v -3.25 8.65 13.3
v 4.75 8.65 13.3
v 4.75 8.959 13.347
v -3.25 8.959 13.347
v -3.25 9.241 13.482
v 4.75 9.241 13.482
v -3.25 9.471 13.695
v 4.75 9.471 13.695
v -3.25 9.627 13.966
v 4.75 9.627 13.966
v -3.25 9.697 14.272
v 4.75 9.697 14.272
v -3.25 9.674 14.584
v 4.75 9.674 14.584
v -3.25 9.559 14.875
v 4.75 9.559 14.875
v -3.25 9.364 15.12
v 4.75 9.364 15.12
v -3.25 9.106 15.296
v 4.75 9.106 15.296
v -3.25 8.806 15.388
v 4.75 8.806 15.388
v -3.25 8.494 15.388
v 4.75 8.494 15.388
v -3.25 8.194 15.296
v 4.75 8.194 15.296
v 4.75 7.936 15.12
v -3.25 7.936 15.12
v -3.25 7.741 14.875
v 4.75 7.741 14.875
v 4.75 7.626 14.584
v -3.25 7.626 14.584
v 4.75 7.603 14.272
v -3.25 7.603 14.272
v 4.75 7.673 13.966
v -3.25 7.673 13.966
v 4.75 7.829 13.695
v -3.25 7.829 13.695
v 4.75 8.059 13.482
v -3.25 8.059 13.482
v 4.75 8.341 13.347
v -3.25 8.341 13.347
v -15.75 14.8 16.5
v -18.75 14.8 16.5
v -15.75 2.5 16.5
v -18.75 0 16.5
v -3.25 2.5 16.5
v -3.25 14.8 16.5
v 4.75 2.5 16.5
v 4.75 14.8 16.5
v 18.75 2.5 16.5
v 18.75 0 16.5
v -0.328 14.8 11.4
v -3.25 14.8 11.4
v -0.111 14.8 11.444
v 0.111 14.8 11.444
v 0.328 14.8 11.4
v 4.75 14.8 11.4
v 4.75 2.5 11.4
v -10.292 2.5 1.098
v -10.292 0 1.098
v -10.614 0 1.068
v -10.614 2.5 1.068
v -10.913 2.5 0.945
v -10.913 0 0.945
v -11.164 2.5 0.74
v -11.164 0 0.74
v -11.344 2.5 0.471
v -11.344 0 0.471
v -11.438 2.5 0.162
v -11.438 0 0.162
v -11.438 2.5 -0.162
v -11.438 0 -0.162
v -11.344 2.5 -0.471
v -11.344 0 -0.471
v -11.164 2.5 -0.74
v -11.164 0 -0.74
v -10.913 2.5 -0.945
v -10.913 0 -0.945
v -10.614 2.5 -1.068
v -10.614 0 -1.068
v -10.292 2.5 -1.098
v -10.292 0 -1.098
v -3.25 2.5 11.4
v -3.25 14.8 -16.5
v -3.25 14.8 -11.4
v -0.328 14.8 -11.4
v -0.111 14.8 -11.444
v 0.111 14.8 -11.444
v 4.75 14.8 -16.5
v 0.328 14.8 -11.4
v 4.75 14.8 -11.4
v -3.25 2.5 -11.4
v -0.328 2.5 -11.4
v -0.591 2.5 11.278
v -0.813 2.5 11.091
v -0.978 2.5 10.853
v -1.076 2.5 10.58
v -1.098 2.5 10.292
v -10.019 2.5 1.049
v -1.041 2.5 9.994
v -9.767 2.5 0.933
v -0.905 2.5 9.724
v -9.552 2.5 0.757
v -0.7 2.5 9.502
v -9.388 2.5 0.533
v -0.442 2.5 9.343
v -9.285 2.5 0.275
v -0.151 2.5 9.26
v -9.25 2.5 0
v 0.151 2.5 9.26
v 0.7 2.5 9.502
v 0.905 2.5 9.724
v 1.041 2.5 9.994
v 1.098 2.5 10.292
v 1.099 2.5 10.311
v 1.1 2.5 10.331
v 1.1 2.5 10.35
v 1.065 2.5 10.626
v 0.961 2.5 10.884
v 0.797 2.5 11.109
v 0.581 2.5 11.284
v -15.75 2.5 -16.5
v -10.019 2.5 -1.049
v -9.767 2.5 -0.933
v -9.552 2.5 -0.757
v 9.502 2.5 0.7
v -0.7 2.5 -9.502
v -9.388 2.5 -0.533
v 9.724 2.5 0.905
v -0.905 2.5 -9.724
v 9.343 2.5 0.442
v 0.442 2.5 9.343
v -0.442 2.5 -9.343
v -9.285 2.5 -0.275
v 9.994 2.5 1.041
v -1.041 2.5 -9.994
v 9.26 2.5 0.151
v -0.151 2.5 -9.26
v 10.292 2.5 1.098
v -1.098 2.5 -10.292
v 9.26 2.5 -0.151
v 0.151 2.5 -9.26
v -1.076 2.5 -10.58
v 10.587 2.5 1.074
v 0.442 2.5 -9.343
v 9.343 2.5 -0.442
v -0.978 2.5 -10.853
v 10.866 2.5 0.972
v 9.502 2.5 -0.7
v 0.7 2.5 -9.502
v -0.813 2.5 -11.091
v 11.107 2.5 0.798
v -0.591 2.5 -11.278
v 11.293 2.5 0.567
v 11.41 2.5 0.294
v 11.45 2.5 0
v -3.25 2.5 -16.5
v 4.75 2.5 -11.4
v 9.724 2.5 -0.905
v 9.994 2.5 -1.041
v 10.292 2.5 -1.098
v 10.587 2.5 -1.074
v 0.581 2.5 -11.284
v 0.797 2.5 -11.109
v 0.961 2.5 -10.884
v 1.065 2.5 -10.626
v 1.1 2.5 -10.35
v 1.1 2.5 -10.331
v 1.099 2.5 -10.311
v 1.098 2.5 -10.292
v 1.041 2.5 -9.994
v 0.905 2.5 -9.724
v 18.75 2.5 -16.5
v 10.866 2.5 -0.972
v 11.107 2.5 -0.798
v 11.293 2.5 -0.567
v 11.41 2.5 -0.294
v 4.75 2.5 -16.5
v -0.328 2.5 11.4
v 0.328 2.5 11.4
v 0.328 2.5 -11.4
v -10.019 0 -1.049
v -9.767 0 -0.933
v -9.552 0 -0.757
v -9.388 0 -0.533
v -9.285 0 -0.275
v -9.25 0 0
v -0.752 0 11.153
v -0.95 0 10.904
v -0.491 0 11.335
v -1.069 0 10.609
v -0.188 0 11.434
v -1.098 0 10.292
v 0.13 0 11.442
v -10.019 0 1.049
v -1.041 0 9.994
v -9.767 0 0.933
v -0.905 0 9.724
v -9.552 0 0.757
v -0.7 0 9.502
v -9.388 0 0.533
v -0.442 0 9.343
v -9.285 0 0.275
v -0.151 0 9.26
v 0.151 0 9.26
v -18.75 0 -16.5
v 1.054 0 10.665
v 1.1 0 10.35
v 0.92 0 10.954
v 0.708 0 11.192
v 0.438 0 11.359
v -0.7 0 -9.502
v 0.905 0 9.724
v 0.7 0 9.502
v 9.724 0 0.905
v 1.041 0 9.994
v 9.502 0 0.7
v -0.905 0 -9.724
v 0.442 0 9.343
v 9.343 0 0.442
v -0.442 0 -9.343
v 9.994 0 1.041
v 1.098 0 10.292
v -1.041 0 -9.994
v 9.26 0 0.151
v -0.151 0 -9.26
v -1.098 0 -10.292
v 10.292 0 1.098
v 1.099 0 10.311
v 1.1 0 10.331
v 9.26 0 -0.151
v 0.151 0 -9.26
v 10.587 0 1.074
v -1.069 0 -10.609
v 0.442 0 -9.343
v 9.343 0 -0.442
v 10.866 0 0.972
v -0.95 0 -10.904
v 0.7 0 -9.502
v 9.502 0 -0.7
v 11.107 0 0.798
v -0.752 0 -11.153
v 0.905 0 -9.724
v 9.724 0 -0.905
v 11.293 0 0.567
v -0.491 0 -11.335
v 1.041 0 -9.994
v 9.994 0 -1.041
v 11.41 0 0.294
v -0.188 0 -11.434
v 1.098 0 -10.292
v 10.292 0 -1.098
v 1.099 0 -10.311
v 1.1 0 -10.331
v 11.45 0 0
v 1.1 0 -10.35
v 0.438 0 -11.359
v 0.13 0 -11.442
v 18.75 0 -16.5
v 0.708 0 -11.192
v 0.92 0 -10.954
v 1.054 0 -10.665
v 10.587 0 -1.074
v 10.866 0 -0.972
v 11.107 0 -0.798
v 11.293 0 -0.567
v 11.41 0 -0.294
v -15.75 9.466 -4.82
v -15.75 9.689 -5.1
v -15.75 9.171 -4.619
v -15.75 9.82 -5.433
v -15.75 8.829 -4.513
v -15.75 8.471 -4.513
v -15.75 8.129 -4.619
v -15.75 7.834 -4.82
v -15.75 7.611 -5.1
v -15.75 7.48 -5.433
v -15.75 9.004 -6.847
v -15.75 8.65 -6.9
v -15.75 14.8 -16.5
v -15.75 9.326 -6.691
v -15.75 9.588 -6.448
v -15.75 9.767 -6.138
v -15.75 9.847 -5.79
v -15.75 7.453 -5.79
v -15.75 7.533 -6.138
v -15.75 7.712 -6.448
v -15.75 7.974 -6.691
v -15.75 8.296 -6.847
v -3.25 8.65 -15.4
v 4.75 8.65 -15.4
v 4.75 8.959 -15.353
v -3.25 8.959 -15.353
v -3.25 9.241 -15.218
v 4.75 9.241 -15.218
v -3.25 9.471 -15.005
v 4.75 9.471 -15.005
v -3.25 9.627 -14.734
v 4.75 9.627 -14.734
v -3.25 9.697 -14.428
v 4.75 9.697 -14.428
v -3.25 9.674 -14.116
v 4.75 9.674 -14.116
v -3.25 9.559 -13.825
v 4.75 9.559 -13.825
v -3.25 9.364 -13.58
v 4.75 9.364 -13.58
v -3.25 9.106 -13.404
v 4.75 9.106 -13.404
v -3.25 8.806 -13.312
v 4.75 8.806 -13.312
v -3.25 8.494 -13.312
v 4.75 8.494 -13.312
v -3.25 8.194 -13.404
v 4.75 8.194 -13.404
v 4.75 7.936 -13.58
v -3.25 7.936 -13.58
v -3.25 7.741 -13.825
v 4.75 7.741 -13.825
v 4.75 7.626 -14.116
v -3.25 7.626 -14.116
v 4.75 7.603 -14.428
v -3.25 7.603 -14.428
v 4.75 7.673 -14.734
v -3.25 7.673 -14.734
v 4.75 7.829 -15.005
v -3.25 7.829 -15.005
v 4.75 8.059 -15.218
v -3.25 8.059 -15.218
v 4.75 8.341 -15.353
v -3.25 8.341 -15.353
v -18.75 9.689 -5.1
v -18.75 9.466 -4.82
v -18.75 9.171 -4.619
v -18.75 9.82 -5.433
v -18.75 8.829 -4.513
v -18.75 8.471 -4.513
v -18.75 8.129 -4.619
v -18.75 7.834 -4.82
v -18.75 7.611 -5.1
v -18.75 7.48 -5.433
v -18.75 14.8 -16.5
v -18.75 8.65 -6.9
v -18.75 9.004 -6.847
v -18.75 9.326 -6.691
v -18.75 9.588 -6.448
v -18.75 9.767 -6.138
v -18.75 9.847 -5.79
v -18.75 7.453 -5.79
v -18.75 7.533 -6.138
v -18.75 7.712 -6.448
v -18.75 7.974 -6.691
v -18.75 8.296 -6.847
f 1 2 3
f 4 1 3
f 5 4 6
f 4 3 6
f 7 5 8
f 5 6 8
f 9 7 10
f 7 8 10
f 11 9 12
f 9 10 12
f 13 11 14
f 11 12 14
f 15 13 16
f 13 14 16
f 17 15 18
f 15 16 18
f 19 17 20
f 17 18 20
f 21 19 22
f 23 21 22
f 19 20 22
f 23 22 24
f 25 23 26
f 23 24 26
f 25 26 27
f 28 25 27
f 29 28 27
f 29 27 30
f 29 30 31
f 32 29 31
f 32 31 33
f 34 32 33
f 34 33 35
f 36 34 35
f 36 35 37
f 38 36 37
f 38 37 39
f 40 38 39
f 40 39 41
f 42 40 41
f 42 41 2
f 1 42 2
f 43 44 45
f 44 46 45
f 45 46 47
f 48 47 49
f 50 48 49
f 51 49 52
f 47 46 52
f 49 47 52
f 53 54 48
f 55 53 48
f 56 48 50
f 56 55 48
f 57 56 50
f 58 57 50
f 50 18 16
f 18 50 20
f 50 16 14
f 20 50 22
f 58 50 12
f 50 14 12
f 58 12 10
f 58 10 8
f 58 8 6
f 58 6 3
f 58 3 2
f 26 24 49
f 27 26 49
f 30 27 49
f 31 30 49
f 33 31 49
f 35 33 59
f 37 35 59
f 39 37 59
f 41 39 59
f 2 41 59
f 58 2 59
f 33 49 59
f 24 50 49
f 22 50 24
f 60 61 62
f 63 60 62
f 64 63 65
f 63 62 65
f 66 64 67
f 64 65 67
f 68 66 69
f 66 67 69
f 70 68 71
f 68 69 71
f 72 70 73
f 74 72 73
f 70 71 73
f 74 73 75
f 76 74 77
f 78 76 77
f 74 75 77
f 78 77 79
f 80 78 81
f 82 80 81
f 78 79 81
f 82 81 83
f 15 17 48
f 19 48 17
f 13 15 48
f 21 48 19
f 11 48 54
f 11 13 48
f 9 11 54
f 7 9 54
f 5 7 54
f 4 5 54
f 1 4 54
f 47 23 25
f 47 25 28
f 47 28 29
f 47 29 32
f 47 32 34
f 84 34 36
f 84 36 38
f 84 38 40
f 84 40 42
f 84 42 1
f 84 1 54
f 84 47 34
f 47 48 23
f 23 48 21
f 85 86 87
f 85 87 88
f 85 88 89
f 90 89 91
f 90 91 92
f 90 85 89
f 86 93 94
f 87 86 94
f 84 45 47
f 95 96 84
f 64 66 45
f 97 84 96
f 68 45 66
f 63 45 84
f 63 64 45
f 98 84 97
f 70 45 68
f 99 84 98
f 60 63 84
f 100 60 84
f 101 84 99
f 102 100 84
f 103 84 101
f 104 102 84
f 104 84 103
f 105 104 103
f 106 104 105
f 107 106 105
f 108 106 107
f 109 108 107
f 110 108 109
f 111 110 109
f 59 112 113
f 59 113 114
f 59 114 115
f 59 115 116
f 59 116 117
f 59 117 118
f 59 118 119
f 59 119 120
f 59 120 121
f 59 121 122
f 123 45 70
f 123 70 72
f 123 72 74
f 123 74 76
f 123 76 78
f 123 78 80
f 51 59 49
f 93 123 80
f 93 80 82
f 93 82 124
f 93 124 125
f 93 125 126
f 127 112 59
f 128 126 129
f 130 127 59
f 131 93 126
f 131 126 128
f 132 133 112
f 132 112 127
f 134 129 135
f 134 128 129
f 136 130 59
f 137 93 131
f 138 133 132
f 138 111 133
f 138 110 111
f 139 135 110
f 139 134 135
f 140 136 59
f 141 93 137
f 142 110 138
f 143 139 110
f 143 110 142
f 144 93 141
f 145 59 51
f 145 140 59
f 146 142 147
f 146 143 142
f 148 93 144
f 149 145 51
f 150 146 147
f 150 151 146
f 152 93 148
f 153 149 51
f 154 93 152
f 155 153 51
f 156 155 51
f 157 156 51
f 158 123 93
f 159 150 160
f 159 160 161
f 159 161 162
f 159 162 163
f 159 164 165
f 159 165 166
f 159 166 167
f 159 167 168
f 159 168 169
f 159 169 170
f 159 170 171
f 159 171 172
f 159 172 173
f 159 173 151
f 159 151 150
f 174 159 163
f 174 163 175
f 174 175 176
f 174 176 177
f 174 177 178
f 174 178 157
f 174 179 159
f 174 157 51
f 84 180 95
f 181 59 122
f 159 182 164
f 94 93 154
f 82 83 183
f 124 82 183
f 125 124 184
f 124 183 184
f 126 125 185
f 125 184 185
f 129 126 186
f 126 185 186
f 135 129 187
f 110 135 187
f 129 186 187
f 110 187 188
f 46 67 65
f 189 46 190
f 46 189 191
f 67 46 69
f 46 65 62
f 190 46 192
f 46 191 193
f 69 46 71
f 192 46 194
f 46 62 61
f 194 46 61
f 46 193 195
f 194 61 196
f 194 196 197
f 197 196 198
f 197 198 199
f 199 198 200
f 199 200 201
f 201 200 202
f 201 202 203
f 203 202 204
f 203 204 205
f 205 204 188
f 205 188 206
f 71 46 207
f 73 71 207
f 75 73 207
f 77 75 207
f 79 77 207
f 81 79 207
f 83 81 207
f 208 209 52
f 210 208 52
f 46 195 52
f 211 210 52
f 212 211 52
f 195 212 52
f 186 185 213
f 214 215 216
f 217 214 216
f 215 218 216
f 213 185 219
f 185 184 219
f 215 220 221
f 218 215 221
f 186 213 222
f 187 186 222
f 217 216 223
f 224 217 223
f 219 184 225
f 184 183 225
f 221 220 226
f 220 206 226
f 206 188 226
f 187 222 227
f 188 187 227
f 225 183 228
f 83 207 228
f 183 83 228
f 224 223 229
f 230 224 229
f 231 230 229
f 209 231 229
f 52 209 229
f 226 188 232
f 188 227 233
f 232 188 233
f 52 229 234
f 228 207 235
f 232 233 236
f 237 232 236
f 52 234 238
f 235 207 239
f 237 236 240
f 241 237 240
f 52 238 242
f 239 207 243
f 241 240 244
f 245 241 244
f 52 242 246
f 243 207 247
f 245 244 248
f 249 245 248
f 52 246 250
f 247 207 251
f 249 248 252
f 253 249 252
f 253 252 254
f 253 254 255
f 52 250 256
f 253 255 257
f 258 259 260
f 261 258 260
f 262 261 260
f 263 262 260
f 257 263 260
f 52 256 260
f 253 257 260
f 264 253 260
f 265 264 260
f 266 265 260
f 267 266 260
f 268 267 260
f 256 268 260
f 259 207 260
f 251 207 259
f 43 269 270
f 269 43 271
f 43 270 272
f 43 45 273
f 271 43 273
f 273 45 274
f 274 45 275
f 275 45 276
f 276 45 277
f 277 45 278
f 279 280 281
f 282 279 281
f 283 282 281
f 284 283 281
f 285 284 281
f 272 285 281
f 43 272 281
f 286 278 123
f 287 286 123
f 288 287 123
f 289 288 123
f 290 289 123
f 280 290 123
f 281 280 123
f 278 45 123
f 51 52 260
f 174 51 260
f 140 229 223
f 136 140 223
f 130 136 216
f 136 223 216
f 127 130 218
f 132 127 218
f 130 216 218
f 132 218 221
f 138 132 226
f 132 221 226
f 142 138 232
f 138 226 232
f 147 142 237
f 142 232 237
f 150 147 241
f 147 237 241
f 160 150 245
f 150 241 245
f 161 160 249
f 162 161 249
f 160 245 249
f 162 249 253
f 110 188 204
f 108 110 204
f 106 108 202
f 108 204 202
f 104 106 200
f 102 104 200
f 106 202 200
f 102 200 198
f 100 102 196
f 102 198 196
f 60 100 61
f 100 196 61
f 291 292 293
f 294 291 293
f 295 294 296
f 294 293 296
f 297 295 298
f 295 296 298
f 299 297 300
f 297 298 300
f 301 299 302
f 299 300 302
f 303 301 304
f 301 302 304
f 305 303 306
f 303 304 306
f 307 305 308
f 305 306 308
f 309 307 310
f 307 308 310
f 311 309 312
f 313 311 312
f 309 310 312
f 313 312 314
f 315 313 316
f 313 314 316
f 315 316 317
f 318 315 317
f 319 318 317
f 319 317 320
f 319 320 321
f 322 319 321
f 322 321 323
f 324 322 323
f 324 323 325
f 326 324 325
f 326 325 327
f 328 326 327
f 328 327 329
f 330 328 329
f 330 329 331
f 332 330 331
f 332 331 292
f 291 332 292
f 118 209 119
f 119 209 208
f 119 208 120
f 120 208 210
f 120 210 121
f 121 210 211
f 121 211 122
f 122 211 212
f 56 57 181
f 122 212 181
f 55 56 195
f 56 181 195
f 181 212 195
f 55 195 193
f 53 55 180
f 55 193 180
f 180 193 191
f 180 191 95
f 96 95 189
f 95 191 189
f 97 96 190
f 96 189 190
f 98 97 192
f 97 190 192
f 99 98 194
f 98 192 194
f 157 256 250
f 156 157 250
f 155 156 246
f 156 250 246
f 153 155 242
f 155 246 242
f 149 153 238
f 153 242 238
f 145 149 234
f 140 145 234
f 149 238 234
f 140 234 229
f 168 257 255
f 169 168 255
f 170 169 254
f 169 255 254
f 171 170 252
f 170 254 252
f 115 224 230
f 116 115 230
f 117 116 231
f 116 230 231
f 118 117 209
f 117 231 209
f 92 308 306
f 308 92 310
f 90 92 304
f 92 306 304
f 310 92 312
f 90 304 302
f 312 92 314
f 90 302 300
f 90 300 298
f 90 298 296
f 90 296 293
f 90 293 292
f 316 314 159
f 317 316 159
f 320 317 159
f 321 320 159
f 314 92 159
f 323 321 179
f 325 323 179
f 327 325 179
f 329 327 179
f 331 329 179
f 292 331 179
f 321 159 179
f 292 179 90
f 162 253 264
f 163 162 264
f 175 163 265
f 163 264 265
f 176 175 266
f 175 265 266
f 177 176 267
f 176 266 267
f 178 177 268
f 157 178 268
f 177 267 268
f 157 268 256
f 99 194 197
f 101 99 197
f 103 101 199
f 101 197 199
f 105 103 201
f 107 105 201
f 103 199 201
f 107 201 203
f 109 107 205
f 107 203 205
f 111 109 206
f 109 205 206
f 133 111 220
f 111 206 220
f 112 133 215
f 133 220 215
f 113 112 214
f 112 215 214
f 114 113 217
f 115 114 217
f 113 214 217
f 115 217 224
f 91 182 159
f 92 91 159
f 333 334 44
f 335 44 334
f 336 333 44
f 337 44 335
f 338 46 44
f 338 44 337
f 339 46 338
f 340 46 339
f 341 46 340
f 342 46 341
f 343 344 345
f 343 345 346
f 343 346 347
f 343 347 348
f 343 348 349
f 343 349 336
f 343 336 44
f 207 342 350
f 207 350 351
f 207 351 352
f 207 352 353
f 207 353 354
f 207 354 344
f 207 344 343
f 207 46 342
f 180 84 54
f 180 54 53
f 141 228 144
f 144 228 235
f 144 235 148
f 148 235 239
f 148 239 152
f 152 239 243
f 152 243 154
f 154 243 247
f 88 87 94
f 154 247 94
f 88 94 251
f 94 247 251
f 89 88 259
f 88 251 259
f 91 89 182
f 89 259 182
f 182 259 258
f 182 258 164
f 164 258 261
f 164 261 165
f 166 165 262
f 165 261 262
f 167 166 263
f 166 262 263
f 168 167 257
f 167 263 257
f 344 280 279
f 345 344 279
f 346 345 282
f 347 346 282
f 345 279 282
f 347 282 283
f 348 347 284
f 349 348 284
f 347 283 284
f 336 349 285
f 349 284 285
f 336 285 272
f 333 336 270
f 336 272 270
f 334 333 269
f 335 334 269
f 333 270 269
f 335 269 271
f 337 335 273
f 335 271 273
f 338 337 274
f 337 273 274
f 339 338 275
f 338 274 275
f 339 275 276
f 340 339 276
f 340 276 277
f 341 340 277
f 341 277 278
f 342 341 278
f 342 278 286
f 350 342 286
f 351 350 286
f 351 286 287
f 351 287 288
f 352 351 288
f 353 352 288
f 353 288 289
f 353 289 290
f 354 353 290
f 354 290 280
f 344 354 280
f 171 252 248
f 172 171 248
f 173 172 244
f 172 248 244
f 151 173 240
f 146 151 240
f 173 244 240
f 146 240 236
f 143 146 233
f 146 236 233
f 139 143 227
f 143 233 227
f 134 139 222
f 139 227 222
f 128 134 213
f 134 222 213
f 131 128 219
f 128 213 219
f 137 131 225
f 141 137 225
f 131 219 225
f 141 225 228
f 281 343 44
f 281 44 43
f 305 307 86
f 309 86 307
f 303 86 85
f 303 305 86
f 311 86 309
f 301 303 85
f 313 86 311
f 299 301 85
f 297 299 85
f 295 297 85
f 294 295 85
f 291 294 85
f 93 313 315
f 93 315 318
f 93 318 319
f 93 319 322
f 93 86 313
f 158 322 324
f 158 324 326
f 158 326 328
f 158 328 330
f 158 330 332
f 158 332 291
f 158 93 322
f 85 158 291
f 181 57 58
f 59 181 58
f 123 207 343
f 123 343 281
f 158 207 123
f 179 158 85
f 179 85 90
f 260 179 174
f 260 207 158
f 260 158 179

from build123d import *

# Parameters (mm, degrees)
SKIZZE1_W                       = 37.5
SKIZZE1_H                       = 33
AUFSATZ_LINEAR_AUSTRAGEN1_DEPTH = 2.5
SKIZZE2_W                       = 3
SKIZZE2_H                       = 33
SKIZZE2_W_2                     = 8
SKIZZE2_H_2                     = 5.1
AUFSATZ_LINEAR_AUSTRAGEN2_DEPTH = 12.3
SCHNITT_LINEAR_AUSTRAGEN3_DEPTH = 30.031922086
SKIZZE5_R                       = 1.2
SCHNITT_LINEAR_AUSTRAGEN4_DEPTH = 42.006584837
SKIZZE7_R                       = 1.05
SCHNITT_LINEAR_AUSTRAGEN5_DEPTH = 10


with BuildPart() as part:
    # Skizze1 → Aufsatz-Linear austragen1 (new body)
    with BuildSketch(Plane(origin=(0, 0, 0), x_dir=(1, 0, 0), z_dir=(0, 1, 0))):
        Rectangle(SKIZZE1_W, SKIZZE1_H)
    extrude(amount=AUFSATZ_LINEAR_AUSTRAGEN1_DEPTH)

    # Skizze2 → Aufsatz-Linear austragen2 (add)
    with BuildSketch(Plane(origin=(0, 2.5, 0), x_dir=(1, 0, 0), z_dir=(0, 1, 0))):
        with Locations((-17.25, 0)):
            Rectangle(SKIZZE2_W, SKIZZE2_H)
        with Locations((0.75, -13.95)):
            Rectangle(SKIZZE2_W_2, SKIZZE2_H_2)
        with Locations((0.75, 13.95)):
            Rectangle(SKIZZE2_W_2, SKIZZE2_H_2)
    extrude(amount=AUFSATZ_LINEAR_AUSTRAGEN2_DEPTH)

    # Skizze6 → Schnitt-Linear austragen3 (cut, through all)
    with BuildSketch(Plane.XZ):
        with BuildLine():
            ThreePointArc((-10.291545894, -1.098445774), (-9.551783389, -0.756868708), (-9.25, 0))
            ThreePointArc((-9.25, 0), (-9.551783389, 0.756868708), (-10.291545894, 1.098445774))
            ThreePointArc((-10.291545894, 1.098445774), (-10.35, 0), (-10.291545894, -1.098445774))
        make_face()
        with BuildLine():
            ThreePointArc((-10.291545894, -1.098445774), (-10.35, 0), (-10.291545894, 1.098445774))
            ThreePointArc((-10.291545894, 1.098445774), (-11.45, 0), (-10.291545894, -1.098445774))
        make_face()
        with BuildLine():
            ThreePointArc((-1.098445774, 10.291545894), (0, 9.25), (1.098445774, 10.291545894))
            ThreePointArc((1.098445774, 10.291545894), (0, 10.35), (-1.098445774, 10.291545894))
        make_face()
        with BuildLine():
            ThreePointArc((-1.098445774, 10.291545894), (0, 10.35), (1.098445774, 10.291545894))
            ThreePointArc((1.098445774, 10.291545894), (1.099611375, 10.320762617), (1.1, 10.35))
            ThreePointArc((1.1, 10.35), (-0.029237383, 11.449611375), (-1.098445774, 10.291545894))
        make_face()
        with BuildLine():
            ThreePointArc((10.291545894, -1.098445774), (11.106868708, -0.798216611), (11.45, 0))
            ThreePointArc((11.45, 0), (11.106868708, 0.798216611), (10.291545894, 1.098445774))
            ThreePointArc((10.291545894, 1.098445774), (10.35, 0), (10.291545894, -1.098445774))
        make_face()
        with BuildLine():
            ThreePointArc((10.291545894, -1.098445774), (10.35, 0), (10.291545894, 1.098445774))
            ThreePointArc((10.291545894, 1.098445774), (9.25, 0), (10.291545894, -1.098445774))
        make_face()
        with BuildLine():
            ThreePointArc((-1.098445774, -10.291545894), (-0.029237383, -11.449611375), (1.1, -10.35))
            ThreePointArc((1.1, -10.35), (1.099611375, -10.320762617), (1.098445774, -10.291545894))
            ThreePointArc((1.098445774, -10.291545894), (0, -10.35), (-1.098445774, -10.291545894))
        make_face()
        with BuildLine():
            ThreePointArc((-1.098445774, -10.291545894), (0, -10.35), (1.098445774, -10.291545894))
            ThreePointArc((1.098445774, -10.291545894), (0, -9.25), (-1.098445774, -10.291545894))
        make_face()
    extrude(amount=-SCHNITT_LINEAR_AUSTRAGEN3_DEPTH, mode=Mode.SUBTRACT)

    # Skizze5 → Schnitt-Linear austragen4 (cut, through all)
    with BuildSketch(Plane(origin=(-15.75, 0, 0), x_dir=(0, 0, -1), z_dir=(1, 0, 0))):
        with Locations((5.7, 8.65)):
            Circle(SKIZZE5_R)
    extrude(amount=-SCHNITT_LINEAR_AUSTRAGEN4_DEPTH, mode=Mode.SUBTRACT)

    # Skizze7 → Schnitt-Linear austragen5 (cut)
    with BuildSketch(Plane(origin=(4.75, 0, 0), x_dir=(0, 0, -1), z_dir=(1, 0, 0))):
        with Locations((-14.35, 8.65)):
            Circle(SKIZZE7_R)
        with Locations((14.35, 8.65)):
            Circle(SKIZZE7_R)
    extrude(amount=-SCHNITT_LINEAR_AUSTRAGEN5_DEPTH, mode=Mode.SUBTRACT)


solid = part.part
